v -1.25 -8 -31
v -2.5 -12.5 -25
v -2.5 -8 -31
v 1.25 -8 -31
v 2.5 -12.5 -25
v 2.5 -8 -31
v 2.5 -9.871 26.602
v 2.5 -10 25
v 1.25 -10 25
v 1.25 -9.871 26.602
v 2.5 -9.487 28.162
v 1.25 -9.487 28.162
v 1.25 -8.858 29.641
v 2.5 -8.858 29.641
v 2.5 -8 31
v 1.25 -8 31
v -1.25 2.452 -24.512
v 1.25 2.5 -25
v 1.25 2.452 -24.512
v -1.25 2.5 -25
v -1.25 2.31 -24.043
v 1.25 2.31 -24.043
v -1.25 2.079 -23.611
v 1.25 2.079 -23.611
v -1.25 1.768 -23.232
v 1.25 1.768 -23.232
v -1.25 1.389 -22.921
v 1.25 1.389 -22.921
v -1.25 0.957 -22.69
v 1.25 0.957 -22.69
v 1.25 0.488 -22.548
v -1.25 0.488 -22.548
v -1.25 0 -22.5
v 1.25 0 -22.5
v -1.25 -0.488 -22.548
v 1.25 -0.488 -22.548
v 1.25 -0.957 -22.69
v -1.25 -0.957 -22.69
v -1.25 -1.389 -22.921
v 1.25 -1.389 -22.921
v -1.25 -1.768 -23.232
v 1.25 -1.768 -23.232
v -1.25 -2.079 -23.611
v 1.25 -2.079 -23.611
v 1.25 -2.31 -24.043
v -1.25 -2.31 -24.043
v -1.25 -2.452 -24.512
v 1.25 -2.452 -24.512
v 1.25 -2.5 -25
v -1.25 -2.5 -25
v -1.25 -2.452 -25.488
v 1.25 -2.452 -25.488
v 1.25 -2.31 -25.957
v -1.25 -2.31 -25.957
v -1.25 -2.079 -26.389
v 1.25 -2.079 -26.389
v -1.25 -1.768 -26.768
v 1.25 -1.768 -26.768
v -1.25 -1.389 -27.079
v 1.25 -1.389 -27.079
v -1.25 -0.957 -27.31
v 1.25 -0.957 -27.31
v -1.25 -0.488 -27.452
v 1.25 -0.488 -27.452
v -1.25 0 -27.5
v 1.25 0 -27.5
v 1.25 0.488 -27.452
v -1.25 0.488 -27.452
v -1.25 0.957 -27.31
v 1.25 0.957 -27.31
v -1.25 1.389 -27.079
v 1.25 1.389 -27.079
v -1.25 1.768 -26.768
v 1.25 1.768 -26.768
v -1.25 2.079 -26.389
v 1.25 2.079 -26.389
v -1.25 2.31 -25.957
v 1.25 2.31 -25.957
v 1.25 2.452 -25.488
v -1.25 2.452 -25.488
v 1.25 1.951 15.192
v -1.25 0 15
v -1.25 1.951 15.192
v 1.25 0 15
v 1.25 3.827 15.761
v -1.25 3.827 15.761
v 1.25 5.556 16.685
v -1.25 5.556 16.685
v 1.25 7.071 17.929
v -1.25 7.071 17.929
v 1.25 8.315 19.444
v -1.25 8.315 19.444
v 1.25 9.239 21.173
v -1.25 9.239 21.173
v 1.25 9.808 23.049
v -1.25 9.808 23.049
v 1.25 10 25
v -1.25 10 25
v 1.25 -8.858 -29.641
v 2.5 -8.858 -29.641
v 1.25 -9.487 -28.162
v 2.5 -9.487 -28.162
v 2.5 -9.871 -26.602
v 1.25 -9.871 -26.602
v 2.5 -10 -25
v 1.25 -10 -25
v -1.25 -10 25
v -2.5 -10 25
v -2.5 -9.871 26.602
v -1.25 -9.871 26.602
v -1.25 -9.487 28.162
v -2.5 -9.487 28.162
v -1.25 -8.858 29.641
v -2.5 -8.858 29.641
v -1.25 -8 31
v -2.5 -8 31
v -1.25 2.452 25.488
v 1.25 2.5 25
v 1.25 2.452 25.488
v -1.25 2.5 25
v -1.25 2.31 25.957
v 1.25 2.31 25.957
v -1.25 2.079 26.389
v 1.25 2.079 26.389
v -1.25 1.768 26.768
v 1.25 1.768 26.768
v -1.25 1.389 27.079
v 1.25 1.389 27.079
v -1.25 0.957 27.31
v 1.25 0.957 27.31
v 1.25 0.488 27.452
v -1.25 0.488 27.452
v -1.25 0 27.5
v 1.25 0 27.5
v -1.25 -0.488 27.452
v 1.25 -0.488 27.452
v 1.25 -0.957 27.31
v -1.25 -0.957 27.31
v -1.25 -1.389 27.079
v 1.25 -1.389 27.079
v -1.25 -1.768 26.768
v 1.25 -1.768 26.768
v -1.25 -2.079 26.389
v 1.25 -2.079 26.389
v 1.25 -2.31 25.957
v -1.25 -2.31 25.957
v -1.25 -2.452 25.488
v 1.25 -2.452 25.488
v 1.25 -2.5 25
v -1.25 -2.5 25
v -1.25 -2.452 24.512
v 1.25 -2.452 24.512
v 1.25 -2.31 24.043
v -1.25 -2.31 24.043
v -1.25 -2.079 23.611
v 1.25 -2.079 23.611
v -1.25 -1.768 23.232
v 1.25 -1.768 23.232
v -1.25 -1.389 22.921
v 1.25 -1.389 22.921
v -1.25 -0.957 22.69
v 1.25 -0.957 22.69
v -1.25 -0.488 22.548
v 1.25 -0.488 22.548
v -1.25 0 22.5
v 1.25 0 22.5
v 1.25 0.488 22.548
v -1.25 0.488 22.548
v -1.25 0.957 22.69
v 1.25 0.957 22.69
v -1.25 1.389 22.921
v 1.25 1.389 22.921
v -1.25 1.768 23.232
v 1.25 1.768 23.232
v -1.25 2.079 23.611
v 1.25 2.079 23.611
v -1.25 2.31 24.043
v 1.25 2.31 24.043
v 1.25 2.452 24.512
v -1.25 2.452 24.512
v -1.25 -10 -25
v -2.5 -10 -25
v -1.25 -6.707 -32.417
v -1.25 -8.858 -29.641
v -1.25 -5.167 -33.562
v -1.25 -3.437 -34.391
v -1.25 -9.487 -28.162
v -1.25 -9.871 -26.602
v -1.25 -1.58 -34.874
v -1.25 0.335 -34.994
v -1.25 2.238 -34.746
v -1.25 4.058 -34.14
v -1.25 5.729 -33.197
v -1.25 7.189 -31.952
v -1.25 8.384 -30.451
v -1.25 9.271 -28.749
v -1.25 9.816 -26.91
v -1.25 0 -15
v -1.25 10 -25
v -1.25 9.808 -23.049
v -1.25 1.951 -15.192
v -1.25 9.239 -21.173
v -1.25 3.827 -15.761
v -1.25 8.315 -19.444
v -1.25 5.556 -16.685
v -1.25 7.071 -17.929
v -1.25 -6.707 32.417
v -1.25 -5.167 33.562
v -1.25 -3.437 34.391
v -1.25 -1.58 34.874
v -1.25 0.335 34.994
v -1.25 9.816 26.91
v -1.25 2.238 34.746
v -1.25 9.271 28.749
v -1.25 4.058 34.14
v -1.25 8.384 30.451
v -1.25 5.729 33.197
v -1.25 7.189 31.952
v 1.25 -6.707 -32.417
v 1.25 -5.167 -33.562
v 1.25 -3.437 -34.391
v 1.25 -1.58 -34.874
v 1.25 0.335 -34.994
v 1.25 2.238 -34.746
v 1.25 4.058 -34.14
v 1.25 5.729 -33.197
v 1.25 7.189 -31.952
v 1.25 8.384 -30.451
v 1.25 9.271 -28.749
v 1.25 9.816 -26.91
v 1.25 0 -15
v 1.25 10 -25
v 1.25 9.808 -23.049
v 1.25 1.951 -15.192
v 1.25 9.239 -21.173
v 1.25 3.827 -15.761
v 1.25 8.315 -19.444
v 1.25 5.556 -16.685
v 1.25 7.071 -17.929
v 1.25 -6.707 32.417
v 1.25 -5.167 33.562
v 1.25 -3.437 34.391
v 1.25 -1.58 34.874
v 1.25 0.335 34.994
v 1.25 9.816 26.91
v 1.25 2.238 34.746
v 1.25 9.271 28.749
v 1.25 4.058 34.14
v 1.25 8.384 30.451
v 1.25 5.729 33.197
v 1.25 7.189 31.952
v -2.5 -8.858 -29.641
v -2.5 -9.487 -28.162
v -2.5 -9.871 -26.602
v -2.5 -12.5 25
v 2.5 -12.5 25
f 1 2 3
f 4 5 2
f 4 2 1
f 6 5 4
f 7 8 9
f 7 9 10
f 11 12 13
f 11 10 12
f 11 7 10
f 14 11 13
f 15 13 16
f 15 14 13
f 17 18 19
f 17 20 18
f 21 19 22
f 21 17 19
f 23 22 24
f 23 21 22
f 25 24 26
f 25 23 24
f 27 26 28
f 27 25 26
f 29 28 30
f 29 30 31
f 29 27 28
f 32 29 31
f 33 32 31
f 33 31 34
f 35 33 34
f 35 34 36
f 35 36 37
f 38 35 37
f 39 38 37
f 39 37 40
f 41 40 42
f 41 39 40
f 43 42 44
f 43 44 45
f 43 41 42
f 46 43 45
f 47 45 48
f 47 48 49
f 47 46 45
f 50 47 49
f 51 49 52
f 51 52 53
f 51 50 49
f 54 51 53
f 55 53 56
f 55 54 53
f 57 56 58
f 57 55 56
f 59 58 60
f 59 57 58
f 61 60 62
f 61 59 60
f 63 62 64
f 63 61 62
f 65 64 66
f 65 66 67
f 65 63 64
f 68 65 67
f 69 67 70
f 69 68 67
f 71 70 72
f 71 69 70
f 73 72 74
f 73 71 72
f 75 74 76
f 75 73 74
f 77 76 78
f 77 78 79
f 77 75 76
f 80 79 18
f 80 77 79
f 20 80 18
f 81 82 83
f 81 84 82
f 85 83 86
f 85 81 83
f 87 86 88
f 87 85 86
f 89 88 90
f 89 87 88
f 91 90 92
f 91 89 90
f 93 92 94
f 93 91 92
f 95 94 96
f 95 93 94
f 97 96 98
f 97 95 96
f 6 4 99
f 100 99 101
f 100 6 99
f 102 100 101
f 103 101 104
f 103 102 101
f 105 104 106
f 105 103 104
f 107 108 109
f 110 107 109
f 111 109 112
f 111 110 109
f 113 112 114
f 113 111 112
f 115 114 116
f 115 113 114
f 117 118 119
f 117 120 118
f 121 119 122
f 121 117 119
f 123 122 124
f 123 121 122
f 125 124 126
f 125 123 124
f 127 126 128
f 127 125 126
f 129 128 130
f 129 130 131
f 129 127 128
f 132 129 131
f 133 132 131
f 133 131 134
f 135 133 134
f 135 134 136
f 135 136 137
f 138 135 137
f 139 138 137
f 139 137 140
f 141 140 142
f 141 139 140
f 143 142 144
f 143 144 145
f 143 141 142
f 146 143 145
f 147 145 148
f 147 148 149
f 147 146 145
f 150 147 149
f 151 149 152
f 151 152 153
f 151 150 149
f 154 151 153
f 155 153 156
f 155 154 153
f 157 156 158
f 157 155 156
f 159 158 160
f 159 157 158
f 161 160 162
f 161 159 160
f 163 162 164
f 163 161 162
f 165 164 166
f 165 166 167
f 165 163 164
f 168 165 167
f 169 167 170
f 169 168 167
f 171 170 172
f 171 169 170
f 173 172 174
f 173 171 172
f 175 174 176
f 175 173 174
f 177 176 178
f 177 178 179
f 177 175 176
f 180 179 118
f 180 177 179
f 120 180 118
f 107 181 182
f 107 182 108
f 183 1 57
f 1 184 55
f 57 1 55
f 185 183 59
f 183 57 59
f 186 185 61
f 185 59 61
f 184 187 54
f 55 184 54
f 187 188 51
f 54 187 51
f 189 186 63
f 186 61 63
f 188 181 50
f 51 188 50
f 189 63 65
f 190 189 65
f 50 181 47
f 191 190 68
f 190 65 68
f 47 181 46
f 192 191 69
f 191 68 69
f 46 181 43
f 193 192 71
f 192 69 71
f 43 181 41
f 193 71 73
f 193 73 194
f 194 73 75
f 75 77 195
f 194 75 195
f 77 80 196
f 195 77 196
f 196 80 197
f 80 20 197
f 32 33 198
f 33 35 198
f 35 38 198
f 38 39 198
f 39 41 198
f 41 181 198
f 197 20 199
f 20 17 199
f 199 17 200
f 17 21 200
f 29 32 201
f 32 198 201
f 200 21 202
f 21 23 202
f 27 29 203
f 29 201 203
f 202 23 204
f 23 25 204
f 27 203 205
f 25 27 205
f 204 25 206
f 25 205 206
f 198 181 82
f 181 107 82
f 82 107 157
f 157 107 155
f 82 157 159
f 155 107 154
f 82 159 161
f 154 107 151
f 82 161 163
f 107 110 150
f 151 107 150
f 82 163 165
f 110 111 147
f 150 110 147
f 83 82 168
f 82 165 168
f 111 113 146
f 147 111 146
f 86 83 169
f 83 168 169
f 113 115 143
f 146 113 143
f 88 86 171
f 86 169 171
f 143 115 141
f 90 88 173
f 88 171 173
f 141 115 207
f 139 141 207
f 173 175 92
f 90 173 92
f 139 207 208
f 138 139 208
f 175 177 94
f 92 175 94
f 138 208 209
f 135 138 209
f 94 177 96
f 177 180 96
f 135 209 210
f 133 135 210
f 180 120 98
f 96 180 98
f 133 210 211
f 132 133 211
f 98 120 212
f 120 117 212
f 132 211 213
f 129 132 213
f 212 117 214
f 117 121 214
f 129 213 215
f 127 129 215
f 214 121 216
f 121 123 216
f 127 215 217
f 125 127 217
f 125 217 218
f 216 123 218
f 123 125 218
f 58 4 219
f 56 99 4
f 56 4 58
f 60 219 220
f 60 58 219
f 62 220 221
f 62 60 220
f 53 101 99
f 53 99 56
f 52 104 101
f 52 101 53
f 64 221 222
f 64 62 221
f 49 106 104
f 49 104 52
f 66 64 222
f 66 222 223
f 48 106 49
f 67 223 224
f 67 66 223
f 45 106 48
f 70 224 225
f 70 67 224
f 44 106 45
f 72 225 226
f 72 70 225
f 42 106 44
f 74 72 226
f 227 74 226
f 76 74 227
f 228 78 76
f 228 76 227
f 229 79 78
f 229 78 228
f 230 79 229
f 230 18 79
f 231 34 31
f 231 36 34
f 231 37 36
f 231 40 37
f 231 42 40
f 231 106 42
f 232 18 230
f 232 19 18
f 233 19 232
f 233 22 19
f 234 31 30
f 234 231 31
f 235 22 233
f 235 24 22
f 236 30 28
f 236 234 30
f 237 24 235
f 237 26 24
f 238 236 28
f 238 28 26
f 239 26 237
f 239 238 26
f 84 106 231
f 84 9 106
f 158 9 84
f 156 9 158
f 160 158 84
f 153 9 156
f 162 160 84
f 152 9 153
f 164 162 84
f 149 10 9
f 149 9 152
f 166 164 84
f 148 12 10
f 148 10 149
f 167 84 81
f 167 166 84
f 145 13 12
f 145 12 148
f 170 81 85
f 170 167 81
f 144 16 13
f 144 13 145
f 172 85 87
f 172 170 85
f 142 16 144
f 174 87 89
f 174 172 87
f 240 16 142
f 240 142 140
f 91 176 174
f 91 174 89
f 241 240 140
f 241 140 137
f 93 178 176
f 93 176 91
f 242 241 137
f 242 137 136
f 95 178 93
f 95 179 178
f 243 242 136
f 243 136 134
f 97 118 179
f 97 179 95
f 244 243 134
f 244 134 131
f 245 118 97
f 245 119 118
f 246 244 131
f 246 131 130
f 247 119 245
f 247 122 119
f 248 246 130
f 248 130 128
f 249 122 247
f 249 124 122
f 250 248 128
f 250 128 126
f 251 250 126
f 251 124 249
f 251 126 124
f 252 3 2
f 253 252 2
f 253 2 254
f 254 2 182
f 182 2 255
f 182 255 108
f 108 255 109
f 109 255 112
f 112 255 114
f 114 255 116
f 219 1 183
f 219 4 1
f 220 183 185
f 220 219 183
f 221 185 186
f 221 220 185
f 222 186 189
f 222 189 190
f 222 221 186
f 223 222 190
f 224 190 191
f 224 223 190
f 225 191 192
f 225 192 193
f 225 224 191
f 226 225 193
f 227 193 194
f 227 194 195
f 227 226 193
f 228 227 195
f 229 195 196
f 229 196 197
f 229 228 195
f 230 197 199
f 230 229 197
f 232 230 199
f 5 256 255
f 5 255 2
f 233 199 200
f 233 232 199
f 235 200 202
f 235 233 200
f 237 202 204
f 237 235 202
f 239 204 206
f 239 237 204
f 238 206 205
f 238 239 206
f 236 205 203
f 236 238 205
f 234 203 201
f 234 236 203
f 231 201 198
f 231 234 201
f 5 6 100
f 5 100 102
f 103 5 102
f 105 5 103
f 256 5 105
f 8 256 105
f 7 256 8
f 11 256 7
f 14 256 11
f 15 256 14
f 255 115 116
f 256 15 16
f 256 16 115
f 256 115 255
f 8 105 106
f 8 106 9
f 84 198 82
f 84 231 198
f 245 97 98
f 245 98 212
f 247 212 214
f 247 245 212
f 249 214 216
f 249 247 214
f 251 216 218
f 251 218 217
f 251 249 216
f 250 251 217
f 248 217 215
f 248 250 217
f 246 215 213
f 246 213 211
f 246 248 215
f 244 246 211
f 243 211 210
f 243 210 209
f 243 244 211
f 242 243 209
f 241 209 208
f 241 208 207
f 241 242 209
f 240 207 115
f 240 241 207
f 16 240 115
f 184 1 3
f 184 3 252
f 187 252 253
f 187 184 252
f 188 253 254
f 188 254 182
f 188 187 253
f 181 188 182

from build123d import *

# Parameters (mm, degrees)
F1_DEPTH = 2.5
F0_R     = 2.5
F2_DEPTH = 1.25


with BuildPart() as f1:
    # F0 (on Right) → F1 (new body, symmetric)
    with BuildSketch(Plane.YZ):
        with BuildLine():
            ThreePointArc((-10, 25), (-9.486833, 28.162278), (-8, 31))
            Line((-8, 31), (-12.5, 25))
            Line((-12.5, 25), (-12.5, -25))
            Line((-12.5, -25), (-8, -31))
            ThreePointArc((-8, -31), (-9.486833, -28.162278), (-10, -25))
            Line((-10, -25), (-10, 25))
        make_face()
    extrude(amount=F1_DEPTH, both=True)

    # F0 (on Right) → F2 (join, symmetric)
    with BuildSketch(Plane.YZ):
        with BuildLine():
            ThreePointArc((0, 15), (7.071068, 17.928932), (10, 25))
            ThreePointArc((10, 25), (3.162278, 34.486833), (-8, 31))
            ThreePointArc((-8, 31), (-9.486833, 28.162278), (-10, 25))
            ThreePointArc((-10, 25), (-7.071068, 17.928932), (0, 15))
        make_face()
        with Locations((0, 25)):
            Circle(F0_R, mode=Mode.SUBTRACT)
        with BuildLine():
            Line((0, -15), (0, 15))
            ThreePointArc((0, 15), (-7.071068, 17.928932), (-10, 25))
            Line((-10, 25), (-10, -25))
            ThreePointArc((-10, -25), (-7.071068, -17.928932), (0, -15))
        make_face()
        with BuildLine():
            ThreePointArc((10, -25), (7.071068, -17.928932), (0, -15))
            ThreePointArc((0, -15), (-7.071068, -17.928932), (-10, -25))
            ThreePointArc((-10, -25), (-9.486833, -28.162278), (-8, -31))
            ThreePointArc((-8, -31), (3.162278, -34.486833), (10, -25))
        make_face()
        with Locations((0, -25)):
            Circle(F0_R, mode=Mode.SUBTRACT)
    extrude(amount=F2_DEPTH, both=True)


solid = f1.part
